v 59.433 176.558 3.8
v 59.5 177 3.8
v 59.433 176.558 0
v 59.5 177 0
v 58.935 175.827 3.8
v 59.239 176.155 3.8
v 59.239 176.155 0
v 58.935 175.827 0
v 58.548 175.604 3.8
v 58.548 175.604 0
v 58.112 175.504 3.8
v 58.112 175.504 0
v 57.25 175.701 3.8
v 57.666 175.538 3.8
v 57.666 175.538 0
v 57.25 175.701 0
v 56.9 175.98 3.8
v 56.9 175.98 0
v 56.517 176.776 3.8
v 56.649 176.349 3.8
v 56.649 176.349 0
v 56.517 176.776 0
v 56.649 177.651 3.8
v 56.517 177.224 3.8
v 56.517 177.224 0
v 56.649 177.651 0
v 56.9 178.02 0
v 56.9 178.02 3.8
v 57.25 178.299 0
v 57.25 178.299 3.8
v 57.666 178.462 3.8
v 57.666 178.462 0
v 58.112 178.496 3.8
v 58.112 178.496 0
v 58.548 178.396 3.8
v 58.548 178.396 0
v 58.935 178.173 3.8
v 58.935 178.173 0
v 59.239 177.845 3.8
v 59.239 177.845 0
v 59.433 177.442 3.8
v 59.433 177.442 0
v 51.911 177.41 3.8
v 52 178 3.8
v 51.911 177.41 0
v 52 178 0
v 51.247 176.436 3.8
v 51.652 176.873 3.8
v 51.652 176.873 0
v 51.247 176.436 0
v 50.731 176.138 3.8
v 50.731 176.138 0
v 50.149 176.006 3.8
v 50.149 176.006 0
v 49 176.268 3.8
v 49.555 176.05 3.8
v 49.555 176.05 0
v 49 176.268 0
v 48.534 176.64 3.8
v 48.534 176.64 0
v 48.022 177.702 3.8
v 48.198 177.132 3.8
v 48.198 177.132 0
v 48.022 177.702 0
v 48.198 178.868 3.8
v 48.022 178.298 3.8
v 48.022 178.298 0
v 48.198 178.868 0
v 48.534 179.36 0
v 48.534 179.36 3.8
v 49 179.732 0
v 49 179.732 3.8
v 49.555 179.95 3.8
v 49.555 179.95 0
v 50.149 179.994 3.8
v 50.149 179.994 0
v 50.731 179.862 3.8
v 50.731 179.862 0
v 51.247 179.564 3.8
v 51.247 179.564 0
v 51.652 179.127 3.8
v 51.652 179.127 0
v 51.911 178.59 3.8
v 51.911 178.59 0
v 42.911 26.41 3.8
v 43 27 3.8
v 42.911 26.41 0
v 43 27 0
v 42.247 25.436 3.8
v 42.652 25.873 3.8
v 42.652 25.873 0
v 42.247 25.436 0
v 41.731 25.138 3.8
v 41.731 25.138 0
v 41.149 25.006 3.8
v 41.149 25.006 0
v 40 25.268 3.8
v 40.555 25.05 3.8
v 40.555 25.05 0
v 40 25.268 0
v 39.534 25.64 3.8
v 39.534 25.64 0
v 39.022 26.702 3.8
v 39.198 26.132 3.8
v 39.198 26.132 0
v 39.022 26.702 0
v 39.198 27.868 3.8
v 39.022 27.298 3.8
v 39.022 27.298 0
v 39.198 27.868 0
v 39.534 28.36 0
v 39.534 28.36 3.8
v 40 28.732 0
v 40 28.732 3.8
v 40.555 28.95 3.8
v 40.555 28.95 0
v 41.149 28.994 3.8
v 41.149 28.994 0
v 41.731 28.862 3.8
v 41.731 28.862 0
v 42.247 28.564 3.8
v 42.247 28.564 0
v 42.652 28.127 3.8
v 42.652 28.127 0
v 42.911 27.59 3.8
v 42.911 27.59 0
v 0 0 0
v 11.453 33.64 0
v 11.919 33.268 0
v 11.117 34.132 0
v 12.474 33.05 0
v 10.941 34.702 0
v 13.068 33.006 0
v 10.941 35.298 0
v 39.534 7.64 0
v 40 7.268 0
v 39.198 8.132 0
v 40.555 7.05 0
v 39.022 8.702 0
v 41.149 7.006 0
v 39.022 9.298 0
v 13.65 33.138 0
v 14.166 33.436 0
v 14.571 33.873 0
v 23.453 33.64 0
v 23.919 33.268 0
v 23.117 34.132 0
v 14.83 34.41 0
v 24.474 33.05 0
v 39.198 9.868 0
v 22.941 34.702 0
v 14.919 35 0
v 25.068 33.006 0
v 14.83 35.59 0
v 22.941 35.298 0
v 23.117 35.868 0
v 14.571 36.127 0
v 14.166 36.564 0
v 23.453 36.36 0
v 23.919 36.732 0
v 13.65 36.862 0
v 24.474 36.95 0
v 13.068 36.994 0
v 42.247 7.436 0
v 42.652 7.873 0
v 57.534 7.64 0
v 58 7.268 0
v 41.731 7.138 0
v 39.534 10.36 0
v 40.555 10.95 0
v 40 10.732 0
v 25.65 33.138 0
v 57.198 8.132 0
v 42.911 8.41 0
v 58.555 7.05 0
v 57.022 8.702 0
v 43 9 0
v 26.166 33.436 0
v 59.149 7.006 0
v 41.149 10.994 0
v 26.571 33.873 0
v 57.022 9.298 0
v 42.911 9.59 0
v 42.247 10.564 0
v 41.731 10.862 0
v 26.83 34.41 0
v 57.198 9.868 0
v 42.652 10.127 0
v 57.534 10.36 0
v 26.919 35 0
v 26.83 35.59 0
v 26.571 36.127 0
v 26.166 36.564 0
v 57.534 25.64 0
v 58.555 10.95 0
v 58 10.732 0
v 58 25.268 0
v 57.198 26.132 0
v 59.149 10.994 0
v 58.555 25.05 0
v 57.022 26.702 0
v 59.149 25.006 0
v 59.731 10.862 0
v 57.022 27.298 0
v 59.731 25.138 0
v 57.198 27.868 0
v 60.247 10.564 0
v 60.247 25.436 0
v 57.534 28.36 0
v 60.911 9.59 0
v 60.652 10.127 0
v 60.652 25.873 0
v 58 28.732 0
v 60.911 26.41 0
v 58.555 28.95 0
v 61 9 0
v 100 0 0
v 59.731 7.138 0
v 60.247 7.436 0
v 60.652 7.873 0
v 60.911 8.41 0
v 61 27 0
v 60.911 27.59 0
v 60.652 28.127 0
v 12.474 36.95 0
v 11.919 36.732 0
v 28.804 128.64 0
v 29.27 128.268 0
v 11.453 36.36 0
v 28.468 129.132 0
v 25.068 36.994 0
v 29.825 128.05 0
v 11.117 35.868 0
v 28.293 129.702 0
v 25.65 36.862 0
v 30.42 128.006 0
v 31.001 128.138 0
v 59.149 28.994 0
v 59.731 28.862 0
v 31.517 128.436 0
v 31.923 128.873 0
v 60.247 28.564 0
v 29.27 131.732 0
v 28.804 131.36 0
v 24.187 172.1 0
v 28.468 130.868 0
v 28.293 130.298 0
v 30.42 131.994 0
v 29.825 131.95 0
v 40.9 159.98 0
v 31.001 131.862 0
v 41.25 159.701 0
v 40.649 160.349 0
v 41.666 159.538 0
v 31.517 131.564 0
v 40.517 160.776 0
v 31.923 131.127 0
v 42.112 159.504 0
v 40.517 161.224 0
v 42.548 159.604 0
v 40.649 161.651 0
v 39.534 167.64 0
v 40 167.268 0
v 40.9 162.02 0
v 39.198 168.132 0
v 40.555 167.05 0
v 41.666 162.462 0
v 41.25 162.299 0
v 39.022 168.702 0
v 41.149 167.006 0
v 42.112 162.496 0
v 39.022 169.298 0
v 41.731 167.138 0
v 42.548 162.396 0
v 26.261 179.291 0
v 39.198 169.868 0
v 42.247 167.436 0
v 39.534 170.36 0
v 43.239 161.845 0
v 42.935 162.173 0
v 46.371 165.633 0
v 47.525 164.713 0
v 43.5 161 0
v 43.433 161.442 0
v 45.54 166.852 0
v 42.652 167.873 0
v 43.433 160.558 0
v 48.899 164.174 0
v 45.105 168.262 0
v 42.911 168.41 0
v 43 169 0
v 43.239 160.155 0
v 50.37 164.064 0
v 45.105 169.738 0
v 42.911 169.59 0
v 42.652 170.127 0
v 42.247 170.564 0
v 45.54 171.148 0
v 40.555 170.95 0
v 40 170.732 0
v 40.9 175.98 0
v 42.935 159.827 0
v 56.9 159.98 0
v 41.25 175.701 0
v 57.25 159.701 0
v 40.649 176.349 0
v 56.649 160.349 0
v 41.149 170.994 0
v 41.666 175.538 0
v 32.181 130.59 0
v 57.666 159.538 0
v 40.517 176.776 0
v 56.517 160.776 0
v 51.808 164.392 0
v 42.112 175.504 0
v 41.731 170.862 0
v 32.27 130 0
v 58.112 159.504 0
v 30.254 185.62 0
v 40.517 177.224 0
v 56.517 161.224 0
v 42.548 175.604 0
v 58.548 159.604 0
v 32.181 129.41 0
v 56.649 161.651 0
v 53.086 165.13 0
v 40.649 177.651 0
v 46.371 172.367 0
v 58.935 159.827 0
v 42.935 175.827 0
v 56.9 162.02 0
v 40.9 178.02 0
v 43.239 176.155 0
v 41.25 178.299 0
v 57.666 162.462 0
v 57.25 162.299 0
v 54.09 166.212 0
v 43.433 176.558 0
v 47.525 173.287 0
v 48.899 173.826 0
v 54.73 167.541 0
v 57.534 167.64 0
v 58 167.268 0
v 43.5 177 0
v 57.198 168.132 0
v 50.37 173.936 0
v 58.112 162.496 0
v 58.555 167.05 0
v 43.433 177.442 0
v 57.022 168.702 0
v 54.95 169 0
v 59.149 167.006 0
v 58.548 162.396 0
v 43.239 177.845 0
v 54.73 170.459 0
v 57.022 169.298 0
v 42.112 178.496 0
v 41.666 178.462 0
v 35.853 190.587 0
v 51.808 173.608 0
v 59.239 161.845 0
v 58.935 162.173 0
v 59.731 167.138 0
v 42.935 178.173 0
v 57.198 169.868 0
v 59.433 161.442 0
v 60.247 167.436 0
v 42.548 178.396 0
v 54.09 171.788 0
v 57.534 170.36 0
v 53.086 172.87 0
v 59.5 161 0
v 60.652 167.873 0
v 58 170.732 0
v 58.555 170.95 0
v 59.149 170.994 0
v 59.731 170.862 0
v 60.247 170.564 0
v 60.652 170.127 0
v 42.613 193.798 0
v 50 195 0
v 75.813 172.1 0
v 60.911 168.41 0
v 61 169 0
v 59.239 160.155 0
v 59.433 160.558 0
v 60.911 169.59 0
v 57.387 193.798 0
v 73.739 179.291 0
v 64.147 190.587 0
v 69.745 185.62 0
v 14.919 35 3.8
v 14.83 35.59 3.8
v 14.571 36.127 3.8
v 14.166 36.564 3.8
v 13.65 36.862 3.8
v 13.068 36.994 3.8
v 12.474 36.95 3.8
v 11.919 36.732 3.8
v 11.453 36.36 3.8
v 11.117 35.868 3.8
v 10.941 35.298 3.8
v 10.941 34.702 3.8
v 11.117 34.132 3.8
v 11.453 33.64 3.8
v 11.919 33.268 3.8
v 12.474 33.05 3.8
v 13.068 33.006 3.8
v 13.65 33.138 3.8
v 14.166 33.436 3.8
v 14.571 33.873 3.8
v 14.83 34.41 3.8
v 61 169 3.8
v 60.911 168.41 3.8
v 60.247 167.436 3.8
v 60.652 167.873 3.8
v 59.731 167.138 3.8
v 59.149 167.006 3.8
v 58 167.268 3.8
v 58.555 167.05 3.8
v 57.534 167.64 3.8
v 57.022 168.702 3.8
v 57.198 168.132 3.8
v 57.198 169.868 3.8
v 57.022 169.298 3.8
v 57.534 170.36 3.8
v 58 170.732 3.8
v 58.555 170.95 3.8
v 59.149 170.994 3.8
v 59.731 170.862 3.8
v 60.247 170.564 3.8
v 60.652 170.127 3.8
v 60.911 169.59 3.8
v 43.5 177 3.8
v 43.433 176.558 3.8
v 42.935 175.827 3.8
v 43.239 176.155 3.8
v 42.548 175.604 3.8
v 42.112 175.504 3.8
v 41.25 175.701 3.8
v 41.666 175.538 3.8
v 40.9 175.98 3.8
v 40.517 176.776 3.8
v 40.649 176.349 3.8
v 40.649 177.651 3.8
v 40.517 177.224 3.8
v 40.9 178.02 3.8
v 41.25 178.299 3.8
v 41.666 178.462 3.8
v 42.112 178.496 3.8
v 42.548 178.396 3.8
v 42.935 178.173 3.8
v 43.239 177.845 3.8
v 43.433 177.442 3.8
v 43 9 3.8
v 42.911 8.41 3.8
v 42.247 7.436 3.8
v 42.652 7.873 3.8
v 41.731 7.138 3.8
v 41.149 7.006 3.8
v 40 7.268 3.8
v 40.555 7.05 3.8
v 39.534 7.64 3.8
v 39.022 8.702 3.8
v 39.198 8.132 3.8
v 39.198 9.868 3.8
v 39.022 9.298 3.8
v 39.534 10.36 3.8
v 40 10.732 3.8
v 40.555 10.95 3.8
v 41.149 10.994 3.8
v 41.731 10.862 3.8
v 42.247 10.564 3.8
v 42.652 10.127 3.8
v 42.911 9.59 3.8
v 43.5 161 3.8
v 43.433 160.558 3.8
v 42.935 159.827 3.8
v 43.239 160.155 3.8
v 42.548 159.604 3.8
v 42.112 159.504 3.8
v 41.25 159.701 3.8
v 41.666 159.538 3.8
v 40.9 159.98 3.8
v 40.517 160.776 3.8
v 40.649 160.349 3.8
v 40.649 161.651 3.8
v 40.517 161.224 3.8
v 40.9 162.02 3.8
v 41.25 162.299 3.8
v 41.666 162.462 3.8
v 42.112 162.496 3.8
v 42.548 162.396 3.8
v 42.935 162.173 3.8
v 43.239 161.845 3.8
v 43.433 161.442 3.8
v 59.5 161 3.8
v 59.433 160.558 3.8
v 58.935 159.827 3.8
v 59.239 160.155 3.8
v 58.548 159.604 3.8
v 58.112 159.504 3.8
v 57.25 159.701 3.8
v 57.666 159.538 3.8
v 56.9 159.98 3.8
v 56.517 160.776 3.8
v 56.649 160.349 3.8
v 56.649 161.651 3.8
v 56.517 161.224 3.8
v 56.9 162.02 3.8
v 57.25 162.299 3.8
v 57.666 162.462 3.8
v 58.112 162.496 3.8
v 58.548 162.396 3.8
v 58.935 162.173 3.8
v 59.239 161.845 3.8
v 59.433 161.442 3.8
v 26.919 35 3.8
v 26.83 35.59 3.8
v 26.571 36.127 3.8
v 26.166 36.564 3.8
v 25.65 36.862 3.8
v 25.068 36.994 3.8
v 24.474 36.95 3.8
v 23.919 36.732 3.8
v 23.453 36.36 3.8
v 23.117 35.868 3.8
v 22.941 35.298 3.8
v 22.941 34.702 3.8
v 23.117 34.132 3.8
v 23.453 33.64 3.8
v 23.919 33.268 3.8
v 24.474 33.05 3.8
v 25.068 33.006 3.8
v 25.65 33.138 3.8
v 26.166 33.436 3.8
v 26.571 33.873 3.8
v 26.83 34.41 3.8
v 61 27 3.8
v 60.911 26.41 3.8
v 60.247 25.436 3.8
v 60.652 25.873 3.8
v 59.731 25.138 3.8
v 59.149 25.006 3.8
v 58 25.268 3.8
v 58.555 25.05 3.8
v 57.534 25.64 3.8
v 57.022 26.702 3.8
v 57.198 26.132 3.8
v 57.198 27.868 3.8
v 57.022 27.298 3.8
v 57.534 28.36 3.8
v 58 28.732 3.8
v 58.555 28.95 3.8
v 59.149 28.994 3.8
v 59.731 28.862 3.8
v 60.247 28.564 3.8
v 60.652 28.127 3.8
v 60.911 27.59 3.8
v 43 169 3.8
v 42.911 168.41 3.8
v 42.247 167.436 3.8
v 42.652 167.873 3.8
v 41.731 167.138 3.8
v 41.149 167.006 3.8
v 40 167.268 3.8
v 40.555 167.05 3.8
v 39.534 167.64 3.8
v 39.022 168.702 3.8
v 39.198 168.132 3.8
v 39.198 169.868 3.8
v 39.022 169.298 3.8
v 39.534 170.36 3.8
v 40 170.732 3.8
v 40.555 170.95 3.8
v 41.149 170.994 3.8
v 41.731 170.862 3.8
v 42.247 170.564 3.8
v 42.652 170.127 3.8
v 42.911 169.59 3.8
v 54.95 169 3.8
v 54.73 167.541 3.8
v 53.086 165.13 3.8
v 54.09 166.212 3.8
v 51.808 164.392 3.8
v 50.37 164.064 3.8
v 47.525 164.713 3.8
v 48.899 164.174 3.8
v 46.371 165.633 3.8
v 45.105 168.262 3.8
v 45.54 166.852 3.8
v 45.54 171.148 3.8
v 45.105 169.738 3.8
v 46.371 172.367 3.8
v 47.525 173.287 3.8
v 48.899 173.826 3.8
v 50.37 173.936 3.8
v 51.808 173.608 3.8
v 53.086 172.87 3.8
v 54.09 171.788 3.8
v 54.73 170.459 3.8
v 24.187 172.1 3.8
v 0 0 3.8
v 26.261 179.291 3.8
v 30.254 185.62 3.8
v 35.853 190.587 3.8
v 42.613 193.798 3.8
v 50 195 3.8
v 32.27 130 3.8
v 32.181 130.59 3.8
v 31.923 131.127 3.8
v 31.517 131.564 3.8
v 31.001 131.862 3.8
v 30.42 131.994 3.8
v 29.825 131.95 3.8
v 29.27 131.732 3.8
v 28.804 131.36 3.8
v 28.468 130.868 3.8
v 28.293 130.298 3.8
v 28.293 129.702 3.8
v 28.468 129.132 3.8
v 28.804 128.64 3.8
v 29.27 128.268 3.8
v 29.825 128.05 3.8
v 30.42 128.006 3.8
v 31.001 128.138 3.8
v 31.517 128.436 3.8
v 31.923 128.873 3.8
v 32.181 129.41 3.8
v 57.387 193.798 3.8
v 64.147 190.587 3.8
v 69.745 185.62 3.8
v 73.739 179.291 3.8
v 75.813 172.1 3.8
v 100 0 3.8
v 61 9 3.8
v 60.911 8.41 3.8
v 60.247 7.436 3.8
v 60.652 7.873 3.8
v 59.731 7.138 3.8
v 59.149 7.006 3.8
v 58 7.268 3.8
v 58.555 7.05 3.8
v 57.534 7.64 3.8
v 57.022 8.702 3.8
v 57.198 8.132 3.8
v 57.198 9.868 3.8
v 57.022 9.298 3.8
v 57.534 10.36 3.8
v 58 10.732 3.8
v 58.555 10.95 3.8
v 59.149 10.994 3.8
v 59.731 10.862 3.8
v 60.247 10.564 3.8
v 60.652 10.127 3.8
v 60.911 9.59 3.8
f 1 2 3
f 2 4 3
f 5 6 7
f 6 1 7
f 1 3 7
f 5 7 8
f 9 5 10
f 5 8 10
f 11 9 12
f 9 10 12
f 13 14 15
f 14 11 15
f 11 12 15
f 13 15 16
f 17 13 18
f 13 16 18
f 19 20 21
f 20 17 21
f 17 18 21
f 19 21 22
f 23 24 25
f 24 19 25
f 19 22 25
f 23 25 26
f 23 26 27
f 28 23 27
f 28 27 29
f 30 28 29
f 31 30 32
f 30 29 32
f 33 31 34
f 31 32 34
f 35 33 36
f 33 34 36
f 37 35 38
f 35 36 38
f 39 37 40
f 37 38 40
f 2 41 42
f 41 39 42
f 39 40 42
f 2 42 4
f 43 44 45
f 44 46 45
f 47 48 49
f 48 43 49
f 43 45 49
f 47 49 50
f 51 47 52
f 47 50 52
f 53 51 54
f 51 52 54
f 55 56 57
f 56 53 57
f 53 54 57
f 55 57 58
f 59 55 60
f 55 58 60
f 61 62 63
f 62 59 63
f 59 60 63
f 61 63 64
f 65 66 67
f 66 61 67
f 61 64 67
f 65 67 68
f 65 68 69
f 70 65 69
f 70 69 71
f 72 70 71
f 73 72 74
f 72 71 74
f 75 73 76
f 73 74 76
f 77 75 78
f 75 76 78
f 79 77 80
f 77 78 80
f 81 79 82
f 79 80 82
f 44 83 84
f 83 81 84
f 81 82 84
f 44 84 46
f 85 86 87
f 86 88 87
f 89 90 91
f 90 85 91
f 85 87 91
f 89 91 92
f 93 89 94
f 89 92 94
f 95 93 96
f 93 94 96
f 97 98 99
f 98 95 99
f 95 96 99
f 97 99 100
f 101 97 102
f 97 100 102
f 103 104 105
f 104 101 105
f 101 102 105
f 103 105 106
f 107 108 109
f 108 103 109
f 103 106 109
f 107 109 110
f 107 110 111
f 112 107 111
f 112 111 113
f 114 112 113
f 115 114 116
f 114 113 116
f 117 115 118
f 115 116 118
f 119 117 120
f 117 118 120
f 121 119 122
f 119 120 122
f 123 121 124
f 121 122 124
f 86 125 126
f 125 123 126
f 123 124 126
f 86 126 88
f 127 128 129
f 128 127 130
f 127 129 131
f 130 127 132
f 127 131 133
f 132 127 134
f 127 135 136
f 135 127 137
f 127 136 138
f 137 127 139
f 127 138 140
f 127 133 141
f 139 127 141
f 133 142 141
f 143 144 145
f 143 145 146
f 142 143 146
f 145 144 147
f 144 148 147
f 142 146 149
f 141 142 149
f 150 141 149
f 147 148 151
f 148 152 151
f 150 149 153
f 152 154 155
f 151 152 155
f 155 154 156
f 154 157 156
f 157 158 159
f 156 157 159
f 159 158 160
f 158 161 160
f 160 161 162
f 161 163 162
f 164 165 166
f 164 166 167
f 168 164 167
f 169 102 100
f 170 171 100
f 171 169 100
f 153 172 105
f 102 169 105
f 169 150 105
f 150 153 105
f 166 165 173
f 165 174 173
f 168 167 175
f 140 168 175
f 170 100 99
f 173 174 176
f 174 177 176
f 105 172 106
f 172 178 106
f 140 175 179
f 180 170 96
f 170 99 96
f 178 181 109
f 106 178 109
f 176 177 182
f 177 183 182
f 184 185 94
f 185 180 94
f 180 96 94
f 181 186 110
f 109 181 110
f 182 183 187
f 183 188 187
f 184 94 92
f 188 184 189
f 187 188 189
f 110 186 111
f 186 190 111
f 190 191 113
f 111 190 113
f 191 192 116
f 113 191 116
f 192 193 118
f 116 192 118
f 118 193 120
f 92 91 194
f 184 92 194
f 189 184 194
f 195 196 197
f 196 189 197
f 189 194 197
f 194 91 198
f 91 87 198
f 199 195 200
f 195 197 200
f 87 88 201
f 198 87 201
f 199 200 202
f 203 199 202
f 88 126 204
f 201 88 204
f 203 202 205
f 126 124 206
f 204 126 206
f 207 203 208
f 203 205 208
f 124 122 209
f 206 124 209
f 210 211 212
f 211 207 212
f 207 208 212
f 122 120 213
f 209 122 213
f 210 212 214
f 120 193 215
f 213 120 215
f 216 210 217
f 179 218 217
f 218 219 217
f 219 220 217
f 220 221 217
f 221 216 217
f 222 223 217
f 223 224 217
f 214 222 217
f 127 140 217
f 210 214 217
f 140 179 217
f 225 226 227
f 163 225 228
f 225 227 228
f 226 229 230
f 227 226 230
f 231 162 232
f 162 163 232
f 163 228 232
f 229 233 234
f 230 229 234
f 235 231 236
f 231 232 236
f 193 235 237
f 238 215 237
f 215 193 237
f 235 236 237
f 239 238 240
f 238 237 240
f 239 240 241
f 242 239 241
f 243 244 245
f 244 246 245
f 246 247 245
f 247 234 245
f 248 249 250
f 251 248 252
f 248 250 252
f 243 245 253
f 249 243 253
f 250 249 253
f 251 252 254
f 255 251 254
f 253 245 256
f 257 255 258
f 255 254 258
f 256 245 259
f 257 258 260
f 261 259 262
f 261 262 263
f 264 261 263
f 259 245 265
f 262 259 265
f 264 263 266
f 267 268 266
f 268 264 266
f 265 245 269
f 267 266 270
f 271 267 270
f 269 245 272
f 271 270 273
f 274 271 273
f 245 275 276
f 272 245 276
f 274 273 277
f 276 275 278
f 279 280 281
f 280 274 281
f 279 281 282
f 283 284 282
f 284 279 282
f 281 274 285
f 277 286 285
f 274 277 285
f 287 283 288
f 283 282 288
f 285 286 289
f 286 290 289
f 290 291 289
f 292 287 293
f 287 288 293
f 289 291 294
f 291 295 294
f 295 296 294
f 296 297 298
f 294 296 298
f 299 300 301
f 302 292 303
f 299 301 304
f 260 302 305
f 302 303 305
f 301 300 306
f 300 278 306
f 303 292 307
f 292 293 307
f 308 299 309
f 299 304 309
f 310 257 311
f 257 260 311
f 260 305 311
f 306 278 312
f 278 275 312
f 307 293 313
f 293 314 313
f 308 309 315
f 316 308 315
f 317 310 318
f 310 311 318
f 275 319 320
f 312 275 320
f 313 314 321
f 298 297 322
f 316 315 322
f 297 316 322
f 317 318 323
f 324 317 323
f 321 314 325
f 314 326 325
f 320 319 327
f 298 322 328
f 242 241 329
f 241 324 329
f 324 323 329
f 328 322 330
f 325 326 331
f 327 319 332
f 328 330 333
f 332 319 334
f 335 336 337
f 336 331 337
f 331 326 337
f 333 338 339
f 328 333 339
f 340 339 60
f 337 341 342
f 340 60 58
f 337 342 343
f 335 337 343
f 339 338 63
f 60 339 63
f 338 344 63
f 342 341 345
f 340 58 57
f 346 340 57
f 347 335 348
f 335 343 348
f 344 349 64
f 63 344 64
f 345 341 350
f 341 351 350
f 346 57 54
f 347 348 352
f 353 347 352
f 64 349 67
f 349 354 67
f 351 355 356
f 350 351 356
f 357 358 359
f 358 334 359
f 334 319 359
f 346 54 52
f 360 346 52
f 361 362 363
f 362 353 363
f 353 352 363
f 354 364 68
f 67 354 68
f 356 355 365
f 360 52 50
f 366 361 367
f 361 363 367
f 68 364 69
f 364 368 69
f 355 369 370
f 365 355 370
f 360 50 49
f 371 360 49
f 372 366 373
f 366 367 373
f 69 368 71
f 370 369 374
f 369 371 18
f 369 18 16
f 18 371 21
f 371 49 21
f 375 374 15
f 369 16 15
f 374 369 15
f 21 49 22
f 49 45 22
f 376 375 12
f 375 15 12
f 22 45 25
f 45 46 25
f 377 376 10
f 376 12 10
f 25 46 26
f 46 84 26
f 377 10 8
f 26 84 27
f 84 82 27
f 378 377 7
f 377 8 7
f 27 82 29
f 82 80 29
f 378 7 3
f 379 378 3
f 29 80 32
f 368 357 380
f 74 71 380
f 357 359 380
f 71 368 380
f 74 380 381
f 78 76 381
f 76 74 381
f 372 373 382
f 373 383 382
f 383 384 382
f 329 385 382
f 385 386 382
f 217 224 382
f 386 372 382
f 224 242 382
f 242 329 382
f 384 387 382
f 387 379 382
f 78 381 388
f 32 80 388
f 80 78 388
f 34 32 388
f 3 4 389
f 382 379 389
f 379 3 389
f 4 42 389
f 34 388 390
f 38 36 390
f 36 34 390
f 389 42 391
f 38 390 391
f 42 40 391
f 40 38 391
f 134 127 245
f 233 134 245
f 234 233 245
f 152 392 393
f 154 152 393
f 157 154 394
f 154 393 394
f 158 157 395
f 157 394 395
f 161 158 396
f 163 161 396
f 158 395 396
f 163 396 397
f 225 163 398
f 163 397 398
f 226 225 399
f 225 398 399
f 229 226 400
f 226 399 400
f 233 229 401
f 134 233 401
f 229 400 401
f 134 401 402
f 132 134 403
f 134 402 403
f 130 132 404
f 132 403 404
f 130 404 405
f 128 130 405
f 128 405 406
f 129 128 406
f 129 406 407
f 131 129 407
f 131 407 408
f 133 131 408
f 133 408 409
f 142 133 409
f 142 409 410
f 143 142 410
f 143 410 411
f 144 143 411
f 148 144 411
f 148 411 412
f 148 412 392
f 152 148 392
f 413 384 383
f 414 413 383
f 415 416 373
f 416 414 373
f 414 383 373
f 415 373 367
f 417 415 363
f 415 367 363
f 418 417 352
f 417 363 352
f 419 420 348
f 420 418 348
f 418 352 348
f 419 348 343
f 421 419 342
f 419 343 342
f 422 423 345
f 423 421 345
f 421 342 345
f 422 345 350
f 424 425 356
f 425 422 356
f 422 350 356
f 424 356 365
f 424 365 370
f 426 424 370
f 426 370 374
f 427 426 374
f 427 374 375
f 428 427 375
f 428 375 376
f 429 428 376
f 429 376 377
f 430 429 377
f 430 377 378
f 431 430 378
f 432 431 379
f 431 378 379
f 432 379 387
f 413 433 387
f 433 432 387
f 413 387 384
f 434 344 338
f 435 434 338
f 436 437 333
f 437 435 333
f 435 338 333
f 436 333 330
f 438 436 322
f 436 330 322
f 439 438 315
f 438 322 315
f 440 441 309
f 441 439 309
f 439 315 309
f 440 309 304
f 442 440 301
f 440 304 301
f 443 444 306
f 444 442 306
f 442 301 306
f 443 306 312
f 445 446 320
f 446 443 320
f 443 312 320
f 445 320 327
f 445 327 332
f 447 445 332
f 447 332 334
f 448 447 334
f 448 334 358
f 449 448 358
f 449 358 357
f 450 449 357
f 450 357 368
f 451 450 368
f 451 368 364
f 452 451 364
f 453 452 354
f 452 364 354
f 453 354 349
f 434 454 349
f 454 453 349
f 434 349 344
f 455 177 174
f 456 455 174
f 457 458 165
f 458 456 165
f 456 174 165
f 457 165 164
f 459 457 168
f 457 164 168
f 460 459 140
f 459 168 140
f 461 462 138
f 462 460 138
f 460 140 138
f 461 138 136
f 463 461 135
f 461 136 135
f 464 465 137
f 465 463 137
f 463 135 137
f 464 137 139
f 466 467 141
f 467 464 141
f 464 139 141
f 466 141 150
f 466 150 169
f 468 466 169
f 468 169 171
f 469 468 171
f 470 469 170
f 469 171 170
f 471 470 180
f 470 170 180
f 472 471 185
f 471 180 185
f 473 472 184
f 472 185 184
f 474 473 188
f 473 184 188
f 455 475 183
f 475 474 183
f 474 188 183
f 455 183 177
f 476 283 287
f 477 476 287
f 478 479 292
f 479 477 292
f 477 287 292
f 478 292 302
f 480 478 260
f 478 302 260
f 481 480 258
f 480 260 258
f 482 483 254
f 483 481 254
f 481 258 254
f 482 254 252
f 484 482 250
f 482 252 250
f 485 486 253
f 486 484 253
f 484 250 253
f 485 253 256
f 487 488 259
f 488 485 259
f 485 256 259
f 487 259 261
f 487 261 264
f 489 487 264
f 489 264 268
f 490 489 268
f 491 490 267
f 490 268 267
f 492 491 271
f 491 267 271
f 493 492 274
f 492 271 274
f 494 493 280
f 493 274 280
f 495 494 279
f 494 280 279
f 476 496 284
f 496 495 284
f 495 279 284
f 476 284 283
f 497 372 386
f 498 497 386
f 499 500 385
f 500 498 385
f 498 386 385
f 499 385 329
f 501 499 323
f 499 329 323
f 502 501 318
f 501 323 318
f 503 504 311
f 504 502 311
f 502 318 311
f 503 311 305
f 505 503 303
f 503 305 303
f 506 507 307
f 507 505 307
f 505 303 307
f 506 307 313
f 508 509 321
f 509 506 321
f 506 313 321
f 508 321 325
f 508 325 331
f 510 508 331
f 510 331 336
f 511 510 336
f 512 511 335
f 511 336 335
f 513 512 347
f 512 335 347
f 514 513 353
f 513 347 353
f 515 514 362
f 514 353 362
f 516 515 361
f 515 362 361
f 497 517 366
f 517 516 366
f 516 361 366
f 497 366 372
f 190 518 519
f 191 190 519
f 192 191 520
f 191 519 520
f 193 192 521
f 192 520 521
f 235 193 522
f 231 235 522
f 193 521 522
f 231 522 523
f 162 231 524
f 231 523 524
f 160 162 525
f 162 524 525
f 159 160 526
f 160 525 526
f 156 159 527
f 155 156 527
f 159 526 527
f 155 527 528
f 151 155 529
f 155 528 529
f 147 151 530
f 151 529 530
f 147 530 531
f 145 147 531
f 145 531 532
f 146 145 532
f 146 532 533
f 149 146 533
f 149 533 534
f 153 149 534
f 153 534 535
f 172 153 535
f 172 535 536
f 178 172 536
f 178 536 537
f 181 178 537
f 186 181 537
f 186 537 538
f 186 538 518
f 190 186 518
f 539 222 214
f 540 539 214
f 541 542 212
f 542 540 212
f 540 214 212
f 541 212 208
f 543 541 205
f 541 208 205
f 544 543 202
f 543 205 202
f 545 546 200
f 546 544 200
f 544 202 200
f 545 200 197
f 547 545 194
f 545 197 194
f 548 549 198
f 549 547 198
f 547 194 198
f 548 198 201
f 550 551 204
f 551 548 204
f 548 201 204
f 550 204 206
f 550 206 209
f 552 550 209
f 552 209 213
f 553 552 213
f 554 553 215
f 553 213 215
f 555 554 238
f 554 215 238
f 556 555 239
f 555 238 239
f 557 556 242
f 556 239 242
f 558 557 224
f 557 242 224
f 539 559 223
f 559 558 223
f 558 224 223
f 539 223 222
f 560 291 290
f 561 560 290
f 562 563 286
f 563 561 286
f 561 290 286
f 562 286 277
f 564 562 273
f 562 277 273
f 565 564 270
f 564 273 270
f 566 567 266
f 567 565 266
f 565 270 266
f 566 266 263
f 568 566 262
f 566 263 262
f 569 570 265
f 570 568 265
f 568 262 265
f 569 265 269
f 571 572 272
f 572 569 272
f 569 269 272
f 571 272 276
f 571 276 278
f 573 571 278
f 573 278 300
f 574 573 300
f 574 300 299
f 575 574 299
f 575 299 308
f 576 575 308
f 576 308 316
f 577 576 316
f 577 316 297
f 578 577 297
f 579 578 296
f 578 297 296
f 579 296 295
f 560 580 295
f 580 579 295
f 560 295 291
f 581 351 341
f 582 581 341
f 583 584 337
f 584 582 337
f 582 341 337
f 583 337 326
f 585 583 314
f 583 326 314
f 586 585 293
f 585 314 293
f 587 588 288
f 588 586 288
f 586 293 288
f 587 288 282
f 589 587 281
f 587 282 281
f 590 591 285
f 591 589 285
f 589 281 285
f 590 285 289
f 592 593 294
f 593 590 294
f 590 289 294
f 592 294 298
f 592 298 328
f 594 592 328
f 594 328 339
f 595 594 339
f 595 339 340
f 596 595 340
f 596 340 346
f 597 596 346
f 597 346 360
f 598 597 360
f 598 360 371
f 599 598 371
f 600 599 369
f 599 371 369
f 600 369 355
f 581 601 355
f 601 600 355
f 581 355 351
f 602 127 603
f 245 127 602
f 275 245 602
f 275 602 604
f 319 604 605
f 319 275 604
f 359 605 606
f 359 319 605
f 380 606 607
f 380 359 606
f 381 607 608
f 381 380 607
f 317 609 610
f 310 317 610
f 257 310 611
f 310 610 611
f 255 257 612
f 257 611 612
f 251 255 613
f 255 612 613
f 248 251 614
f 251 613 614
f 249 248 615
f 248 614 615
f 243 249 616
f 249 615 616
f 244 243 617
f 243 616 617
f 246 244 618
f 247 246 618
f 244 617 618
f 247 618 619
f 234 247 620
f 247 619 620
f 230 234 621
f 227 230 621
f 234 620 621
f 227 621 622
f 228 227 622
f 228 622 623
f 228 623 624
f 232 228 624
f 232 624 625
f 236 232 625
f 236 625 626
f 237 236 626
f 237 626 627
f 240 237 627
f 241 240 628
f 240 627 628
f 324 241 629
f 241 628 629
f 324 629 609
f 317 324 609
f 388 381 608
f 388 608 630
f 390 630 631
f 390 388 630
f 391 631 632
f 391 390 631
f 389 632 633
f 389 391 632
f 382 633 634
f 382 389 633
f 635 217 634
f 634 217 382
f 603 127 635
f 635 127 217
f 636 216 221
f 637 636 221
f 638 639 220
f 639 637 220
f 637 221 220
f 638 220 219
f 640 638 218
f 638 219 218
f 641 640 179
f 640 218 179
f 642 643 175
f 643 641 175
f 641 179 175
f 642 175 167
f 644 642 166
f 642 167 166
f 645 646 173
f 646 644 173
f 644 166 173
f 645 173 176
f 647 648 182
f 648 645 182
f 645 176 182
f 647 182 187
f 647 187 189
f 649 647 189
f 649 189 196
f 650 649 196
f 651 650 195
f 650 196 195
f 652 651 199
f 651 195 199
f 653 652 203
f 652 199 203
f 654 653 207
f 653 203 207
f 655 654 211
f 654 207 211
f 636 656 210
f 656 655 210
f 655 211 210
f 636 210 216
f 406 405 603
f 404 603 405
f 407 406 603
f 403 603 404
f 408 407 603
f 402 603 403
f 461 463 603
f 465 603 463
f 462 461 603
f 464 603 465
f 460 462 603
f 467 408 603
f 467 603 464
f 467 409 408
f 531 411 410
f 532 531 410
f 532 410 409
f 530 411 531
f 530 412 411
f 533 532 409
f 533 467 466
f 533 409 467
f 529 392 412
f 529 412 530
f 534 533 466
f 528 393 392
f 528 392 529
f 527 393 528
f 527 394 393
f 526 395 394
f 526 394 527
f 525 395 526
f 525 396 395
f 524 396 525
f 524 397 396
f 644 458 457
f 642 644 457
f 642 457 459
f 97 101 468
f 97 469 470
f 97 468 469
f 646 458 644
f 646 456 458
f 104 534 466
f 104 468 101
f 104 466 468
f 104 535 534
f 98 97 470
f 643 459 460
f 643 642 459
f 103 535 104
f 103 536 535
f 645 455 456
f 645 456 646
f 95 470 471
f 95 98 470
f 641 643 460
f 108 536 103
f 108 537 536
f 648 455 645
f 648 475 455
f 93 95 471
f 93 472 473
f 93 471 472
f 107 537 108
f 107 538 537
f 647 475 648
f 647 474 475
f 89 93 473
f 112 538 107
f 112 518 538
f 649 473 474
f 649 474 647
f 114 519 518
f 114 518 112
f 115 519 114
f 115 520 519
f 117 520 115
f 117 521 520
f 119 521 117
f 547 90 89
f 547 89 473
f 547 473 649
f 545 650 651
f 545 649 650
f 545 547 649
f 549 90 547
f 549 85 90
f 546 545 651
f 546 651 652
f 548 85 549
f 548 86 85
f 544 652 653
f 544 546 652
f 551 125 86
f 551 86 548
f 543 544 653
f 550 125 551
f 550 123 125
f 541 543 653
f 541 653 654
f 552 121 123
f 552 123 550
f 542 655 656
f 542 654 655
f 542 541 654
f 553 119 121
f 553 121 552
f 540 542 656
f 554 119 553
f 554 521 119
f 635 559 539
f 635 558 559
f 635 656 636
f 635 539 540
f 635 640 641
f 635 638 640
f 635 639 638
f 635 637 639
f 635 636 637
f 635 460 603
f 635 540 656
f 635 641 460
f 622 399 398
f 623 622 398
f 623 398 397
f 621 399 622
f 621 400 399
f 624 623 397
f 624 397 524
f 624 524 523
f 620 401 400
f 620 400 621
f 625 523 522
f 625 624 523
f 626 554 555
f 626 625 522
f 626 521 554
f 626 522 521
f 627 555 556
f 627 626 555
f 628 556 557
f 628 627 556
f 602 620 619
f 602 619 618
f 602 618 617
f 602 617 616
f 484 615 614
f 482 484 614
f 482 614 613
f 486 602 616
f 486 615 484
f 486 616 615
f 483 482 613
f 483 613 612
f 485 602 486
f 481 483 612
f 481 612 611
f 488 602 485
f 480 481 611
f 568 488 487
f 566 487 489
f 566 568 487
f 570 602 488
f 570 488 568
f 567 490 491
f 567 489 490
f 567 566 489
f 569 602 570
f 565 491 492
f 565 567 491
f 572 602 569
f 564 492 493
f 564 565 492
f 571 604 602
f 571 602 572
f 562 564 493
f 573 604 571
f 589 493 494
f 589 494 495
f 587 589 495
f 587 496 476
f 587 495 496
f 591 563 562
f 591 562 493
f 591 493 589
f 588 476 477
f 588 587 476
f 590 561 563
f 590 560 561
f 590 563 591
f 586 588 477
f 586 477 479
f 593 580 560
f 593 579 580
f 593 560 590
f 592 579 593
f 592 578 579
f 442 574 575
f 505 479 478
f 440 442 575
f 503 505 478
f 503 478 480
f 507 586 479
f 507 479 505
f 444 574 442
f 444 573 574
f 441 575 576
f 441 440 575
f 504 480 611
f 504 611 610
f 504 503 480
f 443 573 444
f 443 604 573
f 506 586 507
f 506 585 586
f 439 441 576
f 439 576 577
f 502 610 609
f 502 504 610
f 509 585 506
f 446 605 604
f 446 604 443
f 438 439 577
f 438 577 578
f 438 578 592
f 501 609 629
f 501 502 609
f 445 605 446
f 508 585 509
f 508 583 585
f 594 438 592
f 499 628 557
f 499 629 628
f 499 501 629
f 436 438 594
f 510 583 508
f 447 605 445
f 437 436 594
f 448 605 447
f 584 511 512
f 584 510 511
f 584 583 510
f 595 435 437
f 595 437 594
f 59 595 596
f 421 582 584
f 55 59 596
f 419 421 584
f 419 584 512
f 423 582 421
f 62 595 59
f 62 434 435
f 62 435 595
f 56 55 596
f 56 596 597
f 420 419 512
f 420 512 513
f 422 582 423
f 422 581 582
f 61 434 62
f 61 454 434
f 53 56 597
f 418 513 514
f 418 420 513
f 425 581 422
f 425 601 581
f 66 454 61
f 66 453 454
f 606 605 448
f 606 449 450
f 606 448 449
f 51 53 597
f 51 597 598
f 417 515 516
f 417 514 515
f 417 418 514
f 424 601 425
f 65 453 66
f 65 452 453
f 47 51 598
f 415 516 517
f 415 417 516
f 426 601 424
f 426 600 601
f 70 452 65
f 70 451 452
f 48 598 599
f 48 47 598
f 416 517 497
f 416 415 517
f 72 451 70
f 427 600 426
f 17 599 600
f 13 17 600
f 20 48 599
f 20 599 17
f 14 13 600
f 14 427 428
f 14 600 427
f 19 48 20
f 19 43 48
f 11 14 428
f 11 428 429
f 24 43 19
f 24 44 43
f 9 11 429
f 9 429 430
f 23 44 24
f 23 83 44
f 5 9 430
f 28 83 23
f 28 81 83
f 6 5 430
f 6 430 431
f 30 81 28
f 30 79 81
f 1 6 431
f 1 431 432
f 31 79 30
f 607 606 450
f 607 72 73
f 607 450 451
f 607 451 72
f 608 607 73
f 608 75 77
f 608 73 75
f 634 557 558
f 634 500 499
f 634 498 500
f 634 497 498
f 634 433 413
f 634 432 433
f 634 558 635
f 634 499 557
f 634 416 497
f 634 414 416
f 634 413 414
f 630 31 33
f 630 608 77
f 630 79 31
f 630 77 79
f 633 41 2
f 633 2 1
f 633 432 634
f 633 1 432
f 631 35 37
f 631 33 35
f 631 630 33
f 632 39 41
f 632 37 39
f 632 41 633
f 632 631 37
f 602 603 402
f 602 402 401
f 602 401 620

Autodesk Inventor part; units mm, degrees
ref_plane "YZ Plane" through (0, 0, 0) normal (1, 0, 0) x (0, 1, 0)
ref_plane "XZ Plane" through (0, 0, 0) normal (0, 1, 0) x (-1, 0, 0)
ref_plane "XY Plane" through (0, 0, 0) normal (0, 0, 1) x (1, 0, 0)
sketch "Sketch3" plane through (0, 0, 0) normal (0, 0, 1) x (1, 0, 0)
  line L0 (0, 0) -> (100, 0)
  line L1 (100, 0) -> (100, 195) construction
  line L2 (100, 195) -> (0, 195) construction
  line L3 (0, 195) -> (0, 0) construction
  line L4 (50, 0) -> (50, 169) construction
  circle A0 centre (50, 169) radius 4.95
  line L5 (42, 161) -> (58, 161) construction
  line L6 (58, 161) -> (58, 177) construction
  line L7 (58, 177) -> (42, 177) construction
  line L8 (42, 177) -> (42, 161) construction
  line L9 (42, 161) -> (58, 177) construction
  line L10 (58, 161) -> (42, 177) construction
  circle A1 centre (42, 177) radius 1.5
  circle A2 centre (58, 177) radius 1.5
  circle A3 centre (42, 161) radius 1.5
  circle A4 centre (58, 161) radius 1.5
  line L11 (0, 0) -> (24.1871, 172.1)
  line L12 (0, 0) -> (268.3215, 0) construction
  line L13 (100, 0) -> (75.8129, 172.1)
  line L14 (0, 172.1) -> (100, 172.1) construction
  arc A5 (50, 195) -> (24.1871, 172.1) centre (50.5367, 168.3968) ccw
  arc A6 (75.8129, 172.1) -> (50, 195) centre (49.4633, 168.3968) ccw
  line L15 (50, 169) -> (59, 169) construction
  line L16 (50, 169) -> (41, 169) construction
  circle A7 centre (59, 169) radius 2
  circle A8 centre (41, 169) radius 2
  line L17 (41, 9) -> (59, 9) construction
  line L18 (59, 9) -> (59, 27) construction
  line L19 (59, 27) -> (41, 27) construction
  line L20 (41, 27) -> (41, 9) construction
  line L21 (41, 9) -> (59, 27) construction
  line L22 (59, 9) -> (41, 27) construction
  circle A9 centre (41, 27) radius 2
  circle A10 centre (41, 9) radius 2
  circle A11 centre (59, 27) radius 2
  circle A12 centre (59, 9) radius 2
  line L23 (50, 169) -> (50, 178) construction
  circle A13 centre (50, 178) radius 2
  point P0 (37.3431, 265.7102)
  point P1 (62.6569, 265.7102)
  point P2 (50, 18)
  dimension "d3" = 100
  dimension "d4" = 195
  dimension "d5" = 169
  dimension "d6" = 9.9
  dimension "d7" = 16
  dimension "d8" = 16
  dimension "d9" = 3
  dimension "d10" = 3
  dimension "d11" = 3
  dimension "d12" = 3
  dimension "d13" = 82
  dimension "d14" = 22.9
  dimension "d15" = 9
  dimension "d16" = 4
  dimension "d17" = 18
  dimension "d18" = 18
  dimension "d19" = 9
  dimension "d20" = 4
  dimension "d21" = 4
  dimension "d24" = 9
  dimension "d25" = 4
extrude "Extrusion2" add sketch "Sketch3" along normal blind 3.8
sketch "Sketch5" plane through (0, 0, 3.8) normal (0, 0, 1) x (1, 0, 0)
  circle A0 centre (-58.4959, 27.4361) radius 16.3248
  point P0 (0, 0)
sketch "Sketch6" plane through (0, 0, 3.8) normal (0, 0, 1) x (1, 0, 0)
  line L0 (177.5374, 0) -> (-44.6048, 0) construction
  line L1 (173.8282, 35) -> (-48.3141, 35) construction
  circle A0 centre (12.9189, 35) radius 2
  circle A1 centre (24.9189, 35) radius 2
  line L2 (24.1871, 172.1) -> (0, 0) projected
  point P0 (4.9189, 35)
  dimension "d33" = 35
  dimension "d34" = 4
  dimension "d35" = 4
  dimension "d36" = 12
  dimension "d37" = 8
extrude "Extrusion3" cut sketch "Sketch6" against normal blind 10
sketch "Sketch7" plane through (0, 0, 3.8) normal (0, 0, 1) x (1, 0, 0)
  line L0 (0, 0) -> (115.508, 0) construction
  line L1 (0, 130) -> (115.508, 130)
  line L2 (24.1871, 172.1) -> (0, 0) projected
  circle A0 centre (30.2703, 130) radius 2
  point P0 (18.2703, 130)
  dimension "d40" = 130
  dimension "d41" = 4
  dimension "d42" = 12
extrude "Extrusion4" cut sketch "Sketch7" against normal blind 10
equation "\"d25\" = d16"
properties part number "Columna" material "PMMA Plastic"
